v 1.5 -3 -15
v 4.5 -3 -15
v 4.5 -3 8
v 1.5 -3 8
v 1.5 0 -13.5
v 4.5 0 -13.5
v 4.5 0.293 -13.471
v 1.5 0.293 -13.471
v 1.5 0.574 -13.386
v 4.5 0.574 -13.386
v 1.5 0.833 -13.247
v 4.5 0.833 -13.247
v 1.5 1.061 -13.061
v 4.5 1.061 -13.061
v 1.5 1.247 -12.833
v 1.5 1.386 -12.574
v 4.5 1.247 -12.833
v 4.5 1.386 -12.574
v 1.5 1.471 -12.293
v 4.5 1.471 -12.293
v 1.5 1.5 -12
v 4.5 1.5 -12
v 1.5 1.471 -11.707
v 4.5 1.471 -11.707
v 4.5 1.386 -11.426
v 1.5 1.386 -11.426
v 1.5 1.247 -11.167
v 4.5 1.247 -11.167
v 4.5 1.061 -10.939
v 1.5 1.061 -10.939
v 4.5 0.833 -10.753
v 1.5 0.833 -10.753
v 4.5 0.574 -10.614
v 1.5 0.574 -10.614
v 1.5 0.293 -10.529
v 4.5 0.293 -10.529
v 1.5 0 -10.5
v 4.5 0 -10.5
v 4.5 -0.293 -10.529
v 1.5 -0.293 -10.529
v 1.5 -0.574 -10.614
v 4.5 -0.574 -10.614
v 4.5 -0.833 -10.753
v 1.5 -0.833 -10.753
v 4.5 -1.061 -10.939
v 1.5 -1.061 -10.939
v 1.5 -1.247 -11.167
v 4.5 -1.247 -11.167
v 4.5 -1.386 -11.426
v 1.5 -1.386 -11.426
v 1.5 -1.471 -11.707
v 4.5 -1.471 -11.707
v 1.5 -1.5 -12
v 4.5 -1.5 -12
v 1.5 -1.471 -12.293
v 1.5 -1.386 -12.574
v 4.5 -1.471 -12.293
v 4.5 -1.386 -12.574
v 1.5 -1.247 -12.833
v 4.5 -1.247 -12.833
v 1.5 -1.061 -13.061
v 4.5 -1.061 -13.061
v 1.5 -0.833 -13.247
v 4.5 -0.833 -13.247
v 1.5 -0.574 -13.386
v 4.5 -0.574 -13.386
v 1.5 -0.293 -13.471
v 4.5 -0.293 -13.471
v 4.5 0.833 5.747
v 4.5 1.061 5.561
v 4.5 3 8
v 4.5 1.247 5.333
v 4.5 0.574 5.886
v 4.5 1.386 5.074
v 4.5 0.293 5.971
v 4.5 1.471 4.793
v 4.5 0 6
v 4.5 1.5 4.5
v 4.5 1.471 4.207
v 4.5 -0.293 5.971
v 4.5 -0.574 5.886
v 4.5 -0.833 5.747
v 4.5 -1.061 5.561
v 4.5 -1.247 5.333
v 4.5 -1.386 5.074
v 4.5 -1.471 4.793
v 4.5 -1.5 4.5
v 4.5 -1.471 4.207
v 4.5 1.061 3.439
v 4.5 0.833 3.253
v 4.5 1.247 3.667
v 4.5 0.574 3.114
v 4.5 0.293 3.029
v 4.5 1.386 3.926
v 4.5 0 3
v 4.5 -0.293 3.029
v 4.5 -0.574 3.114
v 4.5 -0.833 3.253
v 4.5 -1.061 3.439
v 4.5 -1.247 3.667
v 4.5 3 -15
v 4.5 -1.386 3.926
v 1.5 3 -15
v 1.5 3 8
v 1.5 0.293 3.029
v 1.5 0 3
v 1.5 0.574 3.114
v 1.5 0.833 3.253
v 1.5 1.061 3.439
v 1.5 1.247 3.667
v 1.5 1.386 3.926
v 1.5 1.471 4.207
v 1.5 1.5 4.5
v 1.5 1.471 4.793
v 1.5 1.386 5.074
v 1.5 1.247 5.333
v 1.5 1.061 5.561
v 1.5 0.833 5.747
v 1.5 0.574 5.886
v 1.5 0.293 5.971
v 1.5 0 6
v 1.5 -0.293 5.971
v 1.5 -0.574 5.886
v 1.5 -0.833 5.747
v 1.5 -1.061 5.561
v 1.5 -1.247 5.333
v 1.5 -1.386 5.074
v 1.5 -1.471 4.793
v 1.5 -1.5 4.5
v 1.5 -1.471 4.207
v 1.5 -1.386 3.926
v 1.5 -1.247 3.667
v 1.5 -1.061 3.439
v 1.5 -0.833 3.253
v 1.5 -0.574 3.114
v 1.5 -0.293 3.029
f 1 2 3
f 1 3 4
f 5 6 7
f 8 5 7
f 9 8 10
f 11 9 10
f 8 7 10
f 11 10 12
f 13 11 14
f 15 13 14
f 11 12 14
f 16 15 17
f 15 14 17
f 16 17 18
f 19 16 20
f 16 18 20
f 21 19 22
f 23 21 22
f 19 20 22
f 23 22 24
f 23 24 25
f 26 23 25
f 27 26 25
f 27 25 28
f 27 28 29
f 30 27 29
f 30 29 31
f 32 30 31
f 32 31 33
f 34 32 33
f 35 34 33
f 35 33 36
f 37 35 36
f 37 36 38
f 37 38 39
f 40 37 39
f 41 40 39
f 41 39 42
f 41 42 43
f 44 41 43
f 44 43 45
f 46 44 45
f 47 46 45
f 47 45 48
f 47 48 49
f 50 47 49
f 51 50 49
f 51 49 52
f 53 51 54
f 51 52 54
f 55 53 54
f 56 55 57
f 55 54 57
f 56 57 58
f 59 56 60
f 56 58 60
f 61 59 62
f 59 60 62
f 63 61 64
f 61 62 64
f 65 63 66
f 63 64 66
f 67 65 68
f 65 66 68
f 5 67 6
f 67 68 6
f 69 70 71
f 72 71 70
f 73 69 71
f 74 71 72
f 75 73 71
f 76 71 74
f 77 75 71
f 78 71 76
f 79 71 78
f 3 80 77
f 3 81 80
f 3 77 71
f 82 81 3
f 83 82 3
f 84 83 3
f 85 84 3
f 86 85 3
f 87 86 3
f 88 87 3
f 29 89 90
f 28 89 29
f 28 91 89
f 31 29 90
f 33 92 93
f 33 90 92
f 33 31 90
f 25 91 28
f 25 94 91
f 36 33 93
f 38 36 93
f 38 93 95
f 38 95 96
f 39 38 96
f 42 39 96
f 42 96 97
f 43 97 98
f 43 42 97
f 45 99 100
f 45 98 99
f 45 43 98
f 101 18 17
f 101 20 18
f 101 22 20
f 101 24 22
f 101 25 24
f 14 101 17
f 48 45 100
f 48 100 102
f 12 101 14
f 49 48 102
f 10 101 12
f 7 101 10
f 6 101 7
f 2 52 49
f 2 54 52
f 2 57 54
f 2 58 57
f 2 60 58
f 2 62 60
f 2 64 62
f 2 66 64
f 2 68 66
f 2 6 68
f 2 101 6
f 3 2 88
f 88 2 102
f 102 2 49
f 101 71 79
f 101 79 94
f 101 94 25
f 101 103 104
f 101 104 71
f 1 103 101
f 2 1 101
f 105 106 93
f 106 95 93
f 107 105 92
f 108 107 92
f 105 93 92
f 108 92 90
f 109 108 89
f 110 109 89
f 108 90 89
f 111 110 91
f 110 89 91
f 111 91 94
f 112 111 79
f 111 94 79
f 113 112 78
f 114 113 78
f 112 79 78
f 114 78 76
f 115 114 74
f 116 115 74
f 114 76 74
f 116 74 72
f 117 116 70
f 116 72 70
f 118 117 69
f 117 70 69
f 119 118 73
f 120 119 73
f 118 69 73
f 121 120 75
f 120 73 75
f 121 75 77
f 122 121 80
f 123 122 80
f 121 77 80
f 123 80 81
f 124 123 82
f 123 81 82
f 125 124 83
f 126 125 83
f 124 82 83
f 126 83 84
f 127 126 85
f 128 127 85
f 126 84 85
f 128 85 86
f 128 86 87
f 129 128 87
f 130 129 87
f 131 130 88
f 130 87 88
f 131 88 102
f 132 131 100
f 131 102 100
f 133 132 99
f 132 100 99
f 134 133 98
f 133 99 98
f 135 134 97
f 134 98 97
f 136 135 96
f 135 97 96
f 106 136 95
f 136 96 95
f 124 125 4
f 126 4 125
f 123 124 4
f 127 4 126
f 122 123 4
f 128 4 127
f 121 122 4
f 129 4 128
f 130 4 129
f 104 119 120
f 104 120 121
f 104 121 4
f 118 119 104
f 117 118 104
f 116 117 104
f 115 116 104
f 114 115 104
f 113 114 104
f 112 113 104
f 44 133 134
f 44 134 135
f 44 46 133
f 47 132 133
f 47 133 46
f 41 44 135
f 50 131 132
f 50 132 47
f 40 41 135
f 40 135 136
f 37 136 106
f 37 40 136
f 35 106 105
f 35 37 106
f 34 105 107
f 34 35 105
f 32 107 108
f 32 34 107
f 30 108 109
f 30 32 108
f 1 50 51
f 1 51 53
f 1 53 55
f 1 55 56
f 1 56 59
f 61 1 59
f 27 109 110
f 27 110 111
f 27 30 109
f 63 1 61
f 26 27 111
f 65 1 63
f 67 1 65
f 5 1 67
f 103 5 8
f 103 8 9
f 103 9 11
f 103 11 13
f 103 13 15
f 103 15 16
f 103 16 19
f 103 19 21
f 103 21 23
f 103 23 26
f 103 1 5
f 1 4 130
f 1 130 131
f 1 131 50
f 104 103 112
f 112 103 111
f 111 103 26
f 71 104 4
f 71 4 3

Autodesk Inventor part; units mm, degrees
ref_plane "YZ Plane" through (0, 0, 0) normal (1, 0, 0) x (0, 1, 0)
ref_plane "XZ Plane" through (0, 0, 0) normal (0, 1, 0) x (-1, 0, 0)
ref_plane "XY Plane" through (0, 0, 0) normal (0, 0, 1) x (1, 0, 0)
sketch "Sketch1" plane through (0, 0, 0) normal (0, 0, 1) x (1, 0, 0)
  line L0 (1.5, 3) -> (4.5, 3) projected
  line L1 (4.5, 3) -> (4.5, -3) projected
  line L2 (4.5, -3) -> (1.5, -3) projected
  line L3 (1.5, -3) -> (1.5, 3) projected
  point P0 (0, 0)
extrude "Extrusion1" add sketch "Sketch1" along normal blind 8 and the other way blind 15
sketch "Sketch2" plane through (4.5, -3, 8) normal (1, 0, 0) x (0, 0, -1)
  circle A0 centre (3.5, 3) radius 1.5
  circle A1 centre (20, 3) radius 1.5
  line L0 (8, 7.2683) -> (8, -1.2683) construction
  point P0 (8, 3)
  dimension "d4" = 3
  dimension "d5" = 3
  dimension "d6" = 12
  dimension "d7" = 4.5
extrude "Extrusion2" cut sketch "Sketch2" against normal blind 8
properties part number "Bearing crossbar"
